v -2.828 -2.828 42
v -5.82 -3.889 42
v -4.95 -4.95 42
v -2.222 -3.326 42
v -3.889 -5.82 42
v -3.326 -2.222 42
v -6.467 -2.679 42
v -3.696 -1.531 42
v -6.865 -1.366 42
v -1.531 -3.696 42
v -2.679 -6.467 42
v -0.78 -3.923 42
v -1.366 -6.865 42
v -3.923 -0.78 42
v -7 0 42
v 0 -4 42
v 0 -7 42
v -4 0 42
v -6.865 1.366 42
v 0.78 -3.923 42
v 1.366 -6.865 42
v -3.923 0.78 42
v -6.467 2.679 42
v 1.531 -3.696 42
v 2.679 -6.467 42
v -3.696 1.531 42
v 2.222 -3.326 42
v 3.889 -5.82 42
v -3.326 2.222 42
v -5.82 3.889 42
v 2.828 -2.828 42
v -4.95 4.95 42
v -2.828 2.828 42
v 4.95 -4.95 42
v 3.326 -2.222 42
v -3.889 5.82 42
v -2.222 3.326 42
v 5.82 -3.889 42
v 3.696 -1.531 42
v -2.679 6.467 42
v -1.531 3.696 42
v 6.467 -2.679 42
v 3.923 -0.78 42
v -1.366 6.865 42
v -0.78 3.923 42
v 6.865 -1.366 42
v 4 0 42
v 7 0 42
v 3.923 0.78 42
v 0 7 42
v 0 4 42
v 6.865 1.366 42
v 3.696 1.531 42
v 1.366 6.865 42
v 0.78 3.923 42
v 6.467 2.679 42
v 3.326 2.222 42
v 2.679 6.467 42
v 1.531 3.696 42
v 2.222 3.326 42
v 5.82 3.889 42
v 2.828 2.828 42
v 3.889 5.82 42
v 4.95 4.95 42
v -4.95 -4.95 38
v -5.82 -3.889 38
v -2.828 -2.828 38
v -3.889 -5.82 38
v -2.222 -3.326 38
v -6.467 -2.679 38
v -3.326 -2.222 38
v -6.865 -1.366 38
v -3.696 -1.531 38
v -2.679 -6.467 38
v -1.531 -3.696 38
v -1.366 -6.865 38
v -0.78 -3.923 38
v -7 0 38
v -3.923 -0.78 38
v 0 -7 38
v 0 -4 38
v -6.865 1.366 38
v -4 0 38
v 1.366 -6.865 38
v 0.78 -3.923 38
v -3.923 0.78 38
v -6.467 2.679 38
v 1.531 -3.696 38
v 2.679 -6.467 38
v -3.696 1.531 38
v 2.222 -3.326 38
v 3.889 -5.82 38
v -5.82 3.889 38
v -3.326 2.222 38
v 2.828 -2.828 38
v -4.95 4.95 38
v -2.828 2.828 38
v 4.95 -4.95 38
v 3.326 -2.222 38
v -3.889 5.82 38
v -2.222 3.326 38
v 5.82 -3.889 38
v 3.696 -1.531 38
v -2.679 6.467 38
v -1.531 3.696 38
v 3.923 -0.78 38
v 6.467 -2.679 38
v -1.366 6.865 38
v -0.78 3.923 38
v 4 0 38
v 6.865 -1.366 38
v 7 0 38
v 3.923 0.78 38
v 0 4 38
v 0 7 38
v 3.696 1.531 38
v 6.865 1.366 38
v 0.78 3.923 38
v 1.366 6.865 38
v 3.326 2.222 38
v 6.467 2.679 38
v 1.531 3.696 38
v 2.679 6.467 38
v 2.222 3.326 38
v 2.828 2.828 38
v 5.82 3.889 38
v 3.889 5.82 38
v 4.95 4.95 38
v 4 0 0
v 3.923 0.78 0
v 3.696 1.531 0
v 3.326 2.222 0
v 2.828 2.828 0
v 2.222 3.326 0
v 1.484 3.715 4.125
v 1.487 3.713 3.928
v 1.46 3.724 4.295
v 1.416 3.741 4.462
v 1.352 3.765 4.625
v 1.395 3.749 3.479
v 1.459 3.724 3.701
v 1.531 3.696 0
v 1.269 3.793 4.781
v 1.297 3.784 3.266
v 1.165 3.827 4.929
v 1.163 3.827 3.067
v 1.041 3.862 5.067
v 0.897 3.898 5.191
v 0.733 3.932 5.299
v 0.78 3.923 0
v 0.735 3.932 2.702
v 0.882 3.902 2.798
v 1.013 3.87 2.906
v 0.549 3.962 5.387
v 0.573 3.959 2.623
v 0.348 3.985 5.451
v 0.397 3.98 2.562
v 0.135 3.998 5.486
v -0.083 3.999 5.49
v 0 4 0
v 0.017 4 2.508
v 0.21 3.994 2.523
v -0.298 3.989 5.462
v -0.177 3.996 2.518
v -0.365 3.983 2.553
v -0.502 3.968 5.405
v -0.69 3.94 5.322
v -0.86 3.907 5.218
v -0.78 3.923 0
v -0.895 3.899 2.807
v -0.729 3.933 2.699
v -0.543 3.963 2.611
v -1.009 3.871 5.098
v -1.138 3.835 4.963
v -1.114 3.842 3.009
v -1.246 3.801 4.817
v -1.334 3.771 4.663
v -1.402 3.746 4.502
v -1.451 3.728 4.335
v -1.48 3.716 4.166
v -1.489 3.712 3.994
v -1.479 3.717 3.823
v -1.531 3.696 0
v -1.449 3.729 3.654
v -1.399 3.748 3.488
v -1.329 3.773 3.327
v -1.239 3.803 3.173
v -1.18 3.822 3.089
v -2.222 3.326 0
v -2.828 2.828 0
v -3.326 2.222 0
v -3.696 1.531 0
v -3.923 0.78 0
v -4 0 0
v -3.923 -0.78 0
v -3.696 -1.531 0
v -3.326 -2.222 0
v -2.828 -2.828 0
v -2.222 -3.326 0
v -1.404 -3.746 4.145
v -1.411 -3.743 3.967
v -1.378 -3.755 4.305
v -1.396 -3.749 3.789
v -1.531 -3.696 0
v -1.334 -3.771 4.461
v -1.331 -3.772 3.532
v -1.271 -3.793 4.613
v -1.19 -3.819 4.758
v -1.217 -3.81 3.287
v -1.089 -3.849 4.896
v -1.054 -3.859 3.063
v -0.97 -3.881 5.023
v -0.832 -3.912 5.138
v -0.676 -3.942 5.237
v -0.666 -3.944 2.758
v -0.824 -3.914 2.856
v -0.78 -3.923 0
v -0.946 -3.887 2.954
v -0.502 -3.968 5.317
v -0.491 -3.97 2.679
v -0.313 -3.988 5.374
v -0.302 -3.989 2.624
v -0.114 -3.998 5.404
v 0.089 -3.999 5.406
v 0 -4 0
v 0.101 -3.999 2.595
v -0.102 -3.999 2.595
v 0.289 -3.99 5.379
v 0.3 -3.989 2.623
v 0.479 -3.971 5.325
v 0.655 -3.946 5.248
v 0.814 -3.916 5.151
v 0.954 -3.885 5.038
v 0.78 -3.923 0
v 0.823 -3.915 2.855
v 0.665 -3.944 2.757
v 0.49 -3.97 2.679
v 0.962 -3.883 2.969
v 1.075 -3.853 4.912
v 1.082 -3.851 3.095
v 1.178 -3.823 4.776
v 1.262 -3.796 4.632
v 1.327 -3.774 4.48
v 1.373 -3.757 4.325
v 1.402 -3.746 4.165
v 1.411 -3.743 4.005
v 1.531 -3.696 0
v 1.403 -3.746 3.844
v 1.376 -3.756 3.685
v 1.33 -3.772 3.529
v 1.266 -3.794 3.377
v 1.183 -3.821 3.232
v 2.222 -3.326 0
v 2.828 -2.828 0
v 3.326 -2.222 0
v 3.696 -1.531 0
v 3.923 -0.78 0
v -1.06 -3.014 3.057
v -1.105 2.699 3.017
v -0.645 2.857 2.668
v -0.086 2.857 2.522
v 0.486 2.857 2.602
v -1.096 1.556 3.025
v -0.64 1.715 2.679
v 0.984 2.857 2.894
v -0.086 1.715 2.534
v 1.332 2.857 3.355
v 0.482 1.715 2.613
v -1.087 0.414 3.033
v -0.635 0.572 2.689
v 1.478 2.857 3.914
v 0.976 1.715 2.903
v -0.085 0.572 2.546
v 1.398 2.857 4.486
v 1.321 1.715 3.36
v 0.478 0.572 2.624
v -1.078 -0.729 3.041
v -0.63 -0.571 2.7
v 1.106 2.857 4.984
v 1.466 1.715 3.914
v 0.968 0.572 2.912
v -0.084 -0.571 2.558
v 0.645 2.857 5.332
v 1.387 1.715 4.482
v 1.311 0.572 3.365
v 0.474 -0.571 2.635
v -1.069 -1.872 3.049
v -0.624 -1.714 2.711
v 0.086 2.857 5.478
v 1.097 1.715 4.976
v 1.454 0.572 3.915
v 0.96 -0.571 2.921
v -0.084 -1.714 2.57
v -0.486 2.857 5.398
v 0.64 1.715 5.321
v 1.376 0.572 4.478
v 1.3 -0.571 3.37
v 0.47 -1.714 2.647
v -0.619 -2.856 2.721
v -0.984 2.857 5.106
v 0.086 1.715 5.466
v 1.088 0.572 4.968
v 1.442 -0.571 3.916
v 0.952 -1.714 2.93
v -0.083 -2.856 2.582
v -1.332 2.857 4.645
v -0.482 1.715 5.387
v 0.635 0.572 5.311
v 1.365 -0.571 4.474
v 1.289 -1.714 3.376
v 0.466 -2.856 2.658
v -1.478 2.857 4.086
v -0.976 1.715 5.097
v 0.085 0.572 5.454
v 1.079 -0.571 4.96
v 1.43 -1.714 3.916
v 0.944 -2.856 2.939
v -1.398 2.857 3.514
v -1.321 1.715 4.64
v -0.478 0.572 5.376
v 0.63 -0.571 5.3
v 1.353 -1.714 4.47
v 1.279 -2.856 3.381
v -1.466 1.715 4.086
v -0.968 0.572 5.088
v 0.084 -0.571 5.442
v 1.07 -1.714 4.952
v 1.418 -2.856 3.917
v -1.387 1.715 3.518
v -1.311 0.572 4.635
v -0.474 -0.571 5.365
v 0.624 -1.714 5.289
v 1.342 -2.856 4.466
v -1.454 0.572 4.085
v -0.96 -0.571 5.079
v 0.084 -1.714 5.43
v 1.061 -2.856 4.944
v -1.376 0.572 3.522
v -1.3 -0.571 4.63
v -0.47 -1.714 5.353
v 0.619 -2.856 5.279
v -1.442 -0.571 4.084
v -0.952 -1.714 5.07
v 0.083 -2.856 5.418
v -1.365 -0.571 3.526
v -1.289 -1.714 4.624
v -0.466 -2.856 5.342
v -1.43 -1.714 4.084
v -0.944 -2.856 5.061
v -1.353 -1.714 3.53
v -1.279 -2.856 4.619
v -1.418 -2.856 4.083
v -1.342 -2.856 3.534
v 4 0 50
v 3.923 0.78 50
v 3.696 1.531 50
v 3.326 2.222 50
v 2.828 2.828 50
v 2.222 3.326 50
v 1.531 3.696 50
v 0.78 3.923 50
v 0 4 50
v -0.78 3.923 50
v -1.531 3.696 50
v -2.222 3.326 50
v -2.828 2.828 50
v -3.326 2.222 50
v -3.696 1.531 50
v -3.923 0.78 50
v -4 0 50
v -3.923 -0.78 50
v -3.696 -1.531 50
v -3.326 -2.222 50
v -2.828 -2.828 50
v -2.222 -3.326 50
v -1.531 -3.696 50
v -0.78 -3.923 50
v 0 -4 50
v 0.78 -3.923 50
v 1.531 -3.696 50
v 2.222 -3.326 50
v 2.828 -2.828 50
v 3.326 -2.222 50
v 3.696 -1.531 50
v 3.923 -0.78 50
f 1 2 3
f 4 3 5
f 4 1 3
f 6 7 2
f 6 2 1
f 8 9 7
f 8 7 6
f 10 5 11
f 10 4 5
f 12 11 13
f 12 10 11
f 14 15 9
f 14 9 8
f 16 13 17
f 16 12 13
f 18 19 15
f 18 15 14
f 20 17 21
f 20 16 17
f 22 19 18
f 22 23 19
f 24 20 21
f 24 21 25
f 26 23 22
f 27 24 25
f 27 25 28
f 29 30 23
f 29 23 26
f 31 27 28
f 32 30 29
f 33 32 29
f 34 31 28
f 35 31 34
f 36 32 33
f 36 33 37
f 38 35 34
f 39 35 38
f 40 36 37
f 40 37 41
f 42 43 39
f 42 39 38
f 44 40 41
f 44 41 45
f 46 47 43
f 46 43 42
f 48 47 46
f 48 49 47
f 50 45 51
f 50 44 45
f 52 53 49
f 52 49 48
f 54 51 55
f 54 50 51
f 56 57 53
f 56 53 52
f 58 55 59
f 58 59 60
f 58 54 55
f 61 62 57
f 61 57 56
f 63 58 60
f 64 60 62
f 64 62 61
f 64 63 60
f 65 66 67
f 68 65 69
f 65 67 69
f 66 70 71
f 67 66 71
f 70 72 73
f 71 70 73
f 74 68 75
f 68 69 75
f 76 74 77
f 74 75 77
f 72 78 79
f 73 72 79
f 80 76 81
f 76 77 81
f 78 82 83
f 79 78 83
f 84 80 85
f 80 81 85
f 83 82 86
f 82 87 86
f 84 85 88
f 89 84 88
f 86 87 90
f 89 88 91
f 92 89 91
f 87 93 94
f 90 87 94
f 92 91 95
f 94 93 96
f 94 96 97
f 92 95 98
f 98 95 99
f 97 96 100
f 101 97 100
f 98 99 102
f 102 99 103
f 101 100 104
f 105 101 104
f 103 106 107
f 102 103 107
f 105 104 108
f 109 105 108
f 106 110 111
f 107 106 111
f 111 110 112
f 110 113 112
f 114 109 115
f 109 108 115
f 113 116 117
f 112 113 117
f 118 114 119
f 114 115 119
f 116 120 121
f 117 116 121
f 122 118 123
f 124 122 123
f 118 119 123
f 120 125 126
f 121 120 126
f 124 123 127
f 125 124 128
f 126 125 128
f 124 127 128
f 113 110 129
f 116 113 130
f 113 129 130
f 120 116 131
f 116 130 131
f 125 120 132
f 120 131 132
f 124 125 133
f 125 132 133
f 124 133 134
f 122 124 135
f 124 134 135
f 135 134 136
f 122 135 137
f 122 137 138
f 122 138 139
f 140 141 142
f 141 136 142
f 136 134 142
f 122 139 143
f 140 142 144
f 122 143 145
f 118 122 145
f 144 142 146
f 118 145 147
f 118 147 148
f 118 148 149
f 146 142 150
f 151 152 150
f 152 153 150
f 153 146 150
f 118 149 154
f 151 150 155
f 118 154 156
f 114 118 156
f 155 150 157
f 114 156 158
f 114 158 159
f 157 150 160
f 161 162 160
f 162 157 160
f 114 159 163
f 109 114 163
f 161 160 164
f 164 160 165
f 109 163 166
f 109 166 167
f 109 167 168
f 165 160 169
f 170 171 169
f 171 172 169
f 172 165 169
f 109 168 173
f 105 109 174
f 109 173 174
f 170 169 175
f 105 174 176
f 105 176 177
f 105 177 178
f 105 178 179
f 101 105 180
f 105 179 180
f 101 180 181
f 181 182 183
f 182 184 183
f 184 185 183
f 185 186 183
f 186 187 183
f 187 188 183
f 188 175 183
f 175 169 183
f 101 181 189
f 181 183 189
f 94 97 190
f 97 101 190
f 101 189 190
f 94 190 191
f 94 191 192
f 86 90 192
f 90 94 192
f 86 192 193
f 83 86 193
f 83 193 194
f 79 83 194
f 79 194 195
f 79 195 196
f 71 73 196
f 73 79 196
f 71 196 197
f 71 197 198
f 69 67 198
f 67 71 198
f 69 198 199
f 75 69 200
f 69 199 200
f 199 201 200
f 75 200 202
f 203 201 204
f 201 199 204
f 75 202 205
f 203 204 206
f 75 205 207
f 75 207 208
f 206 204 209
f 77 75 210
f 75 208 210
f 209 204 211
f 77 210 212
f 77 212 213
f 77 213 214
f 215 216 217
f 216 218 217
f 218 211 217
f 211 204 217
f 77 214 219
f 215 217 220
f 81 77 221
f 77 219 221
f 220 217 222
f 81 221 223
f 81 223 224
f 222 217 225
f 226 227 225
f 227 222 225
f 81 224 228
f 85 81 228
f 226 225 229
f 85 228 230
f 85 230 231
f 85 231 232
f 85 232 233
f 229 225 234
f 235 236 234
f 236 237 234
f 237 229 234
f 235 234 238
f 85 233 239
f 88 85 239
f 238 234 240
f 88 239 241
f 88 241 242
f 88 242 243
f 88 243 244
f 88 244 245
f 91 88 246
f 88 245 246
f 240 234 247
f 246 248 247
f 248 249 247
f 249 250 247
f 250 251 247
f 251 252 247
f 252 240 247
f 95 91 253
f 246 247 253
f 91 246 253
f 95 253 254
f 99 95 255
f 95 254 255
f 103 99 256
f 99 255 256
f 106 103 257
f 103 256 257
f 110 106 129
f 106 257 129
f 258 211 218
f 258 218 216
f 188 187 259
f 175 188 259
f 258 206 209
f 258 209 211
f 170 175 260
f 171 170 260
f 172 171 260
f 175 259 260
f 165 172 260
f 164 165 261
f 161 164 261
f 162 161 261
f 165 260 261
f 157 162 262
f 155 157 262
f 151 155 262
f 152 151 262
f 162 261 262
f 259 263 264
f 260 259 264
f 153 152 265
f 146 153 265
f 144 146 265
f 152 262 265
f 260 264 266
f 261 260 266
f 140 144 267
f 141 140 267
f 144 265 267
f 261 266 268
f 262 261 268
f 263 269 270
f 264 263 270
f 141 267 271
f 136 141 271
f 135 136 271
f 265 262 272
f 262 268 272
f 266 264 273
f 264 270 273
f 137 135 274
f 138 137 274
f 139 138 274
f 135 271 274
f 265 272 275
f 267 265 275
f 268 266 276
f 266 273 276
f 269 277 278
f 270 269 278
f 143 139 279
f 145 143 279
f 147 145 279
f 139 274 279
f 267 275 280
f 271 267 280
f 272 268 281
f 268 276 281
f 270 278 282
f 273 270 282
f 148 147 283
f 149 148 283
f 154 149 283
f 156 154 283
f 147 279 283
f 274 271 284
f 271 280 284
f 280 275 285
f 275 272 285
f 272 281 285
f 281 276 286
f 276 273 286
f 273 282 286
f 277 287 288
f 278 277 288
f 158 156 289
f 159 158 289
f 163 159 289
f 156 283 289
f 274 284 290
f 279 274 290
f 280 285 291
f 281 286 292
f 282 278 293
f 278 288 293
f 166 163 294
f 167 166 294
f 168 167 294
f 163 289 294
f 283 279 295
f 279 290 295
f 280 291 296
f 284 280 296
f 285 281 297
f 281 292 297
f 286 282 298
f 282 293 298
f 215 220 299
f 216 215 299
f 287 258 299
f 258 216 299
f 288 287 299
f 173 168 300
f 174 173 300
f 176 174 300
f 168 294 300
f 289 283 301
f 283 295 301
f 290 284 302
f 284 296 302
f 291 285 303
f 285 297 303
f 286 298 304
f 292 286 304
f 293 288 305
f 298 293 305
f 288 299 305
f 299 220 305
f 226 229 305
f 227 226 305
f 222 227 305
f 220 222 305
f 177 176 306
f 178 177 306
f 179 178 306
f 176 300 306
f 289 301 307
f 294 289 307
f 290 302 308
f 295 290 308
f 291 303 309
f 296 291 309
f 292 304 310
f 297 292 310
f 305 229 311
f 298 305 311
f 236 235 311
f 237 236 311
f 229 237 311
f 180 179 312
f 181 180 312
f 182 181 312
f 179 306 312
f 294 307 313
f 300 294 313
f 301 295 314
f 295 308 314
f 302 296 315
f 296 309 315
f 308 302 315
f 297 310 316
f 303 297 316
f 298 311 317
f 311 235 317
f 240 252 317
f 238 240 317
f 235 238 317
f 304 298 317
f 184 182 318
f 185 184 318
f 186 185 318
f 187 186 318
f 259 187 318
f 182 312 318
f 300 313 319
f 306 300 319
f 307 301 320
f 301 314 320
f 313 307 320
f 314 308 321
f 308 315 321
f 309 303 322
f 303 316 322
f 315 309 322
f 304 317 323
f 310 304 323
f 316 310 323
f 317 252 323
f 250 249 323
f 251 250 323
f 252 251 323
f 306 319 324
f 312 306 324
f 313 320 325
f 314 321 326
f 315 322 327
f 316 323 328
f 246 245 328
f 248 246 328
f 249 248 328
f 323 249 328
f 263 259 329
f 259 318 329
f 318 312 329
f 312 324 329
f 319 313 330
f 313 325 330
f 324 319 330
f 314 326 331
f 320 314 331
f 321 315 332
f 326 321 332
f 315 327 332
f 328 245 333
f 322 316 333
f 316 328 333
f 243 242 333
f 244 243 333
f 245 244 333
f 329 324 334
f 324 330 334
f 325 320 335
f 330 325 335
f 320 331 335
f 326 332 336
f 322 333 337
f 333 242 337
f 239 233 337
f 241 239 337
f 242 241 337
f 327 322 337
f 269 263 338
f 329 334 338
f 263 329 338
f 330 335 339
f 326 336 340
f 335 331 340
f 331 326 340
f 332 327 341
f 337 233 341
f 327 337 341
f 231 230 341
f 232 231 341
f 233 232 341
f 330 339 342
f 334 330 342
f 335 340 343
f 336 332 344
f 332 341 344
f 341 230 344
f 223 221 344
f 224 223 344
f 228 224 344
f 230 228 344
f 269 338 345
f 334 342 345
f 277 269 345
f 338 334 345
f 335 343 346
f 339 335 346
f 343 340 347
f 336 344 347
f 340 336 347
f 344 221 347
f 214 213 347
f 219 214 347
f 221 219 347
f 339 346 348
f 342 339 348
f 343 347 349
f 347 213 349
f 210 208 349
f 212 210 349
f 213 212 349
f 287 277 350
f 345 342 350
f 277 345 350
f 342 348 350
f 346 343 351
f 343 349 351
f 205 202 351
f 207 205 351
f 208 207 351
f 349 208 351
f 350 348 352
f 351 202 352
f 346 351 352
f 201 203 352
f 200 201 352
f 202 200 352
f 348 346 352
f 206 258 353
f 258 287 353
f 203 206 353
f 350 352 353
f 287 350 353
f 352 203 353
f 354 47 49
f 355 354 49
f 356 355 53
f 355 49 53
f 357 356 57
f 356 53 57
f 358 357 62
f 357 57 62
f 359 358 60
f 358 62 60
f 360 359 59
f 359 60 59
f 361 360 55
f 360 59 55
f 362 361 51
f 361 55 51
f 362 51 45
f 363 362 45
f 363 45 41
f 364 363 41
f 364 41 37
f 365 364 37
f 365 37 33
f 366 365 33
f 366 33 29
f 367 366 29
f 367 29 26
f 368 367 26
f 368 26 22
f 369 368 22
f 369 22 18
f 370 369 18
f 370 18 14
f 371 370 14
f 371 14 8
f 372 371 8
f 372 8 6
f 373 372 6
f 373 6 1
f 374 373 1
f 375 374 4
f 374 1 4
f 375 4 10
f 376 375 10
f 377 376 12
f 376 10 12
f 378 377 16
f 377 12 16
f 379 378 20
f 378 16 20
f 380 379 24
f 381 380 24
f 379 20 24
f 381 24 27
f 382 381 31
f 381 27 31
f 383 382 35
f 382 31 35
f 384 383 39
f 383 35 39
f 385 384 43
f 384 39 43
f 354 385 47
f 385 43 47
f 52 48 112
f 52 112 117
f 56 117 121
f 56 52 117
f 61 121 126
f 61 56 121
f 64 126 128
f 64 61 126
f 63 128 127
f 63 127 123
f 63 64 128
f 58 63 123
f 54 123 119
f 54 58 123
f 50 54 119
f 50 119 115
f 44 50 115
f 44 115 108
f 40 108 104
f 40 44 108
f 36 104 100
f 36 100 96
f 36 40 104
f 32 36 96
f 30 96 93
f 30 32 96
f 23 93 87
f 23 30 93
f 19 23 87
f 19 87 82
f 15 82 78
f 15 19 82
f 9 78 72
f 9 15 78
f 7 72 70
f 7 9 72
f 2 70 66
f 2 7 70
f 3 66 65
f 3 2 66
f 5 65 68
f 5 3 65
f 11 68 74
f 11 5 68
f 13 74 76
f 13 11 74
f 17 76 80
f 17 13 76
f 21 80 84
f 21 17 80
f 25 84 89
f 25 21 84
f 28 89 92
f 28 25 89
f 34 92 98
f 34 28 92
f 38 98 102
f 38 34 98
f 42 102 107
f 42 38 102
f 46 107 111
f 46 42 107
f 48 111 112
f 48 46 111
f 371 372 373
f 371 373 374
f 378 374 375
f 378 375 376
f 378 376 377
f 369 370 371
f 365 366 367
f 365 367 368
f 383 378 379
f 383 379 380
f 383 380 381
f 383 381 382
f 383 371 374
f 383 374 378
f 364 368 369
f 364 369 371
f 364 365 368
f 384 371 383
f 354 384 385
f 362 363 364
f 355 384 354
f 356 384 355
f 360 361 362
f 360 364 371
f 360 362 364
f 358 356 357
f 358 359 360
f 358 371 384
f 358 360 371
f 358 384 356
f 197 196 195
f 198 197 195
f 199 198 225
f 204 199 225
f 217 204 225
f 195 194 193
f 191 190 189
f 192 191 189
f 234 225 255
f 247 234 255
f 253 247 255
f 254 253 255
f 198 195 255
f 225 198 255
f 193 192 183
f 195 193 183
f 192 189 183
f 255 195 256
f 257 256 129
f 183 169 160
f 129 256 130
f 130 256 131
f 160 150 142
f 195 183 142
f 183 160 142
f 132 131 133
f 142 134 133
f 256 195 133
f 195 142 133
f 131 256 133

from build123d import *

# Parameters (mm, degrees)
SKETCH_1_R      = 4
EXTRUDE_1_DEPTH = 50
EXTRUDE_START   = -8
SKETCH_2_R      = 7
EXTRUDE_2_DEPTH = 4


with BuildPart() as part:
    # 草图1 → 凸台-拉伸1 (new body)
    with BuildSketch(Plane.XY):
        Circle(SKETCH_1_R)
    extrude(amount=EXTRUDE_1_DEPTH)

    # 草图2 → 凸台-拉伸2 (add)
    with BuildSketch(Plane.XY.offset(50).offset(EXTRUDE_START)):
        Circle(SKETCH_2_R)
    extrude(amount=-EXTRUDE_2_DEPTH)

    # 草图4 → 切除-旋转1 (revolve, cut)
    with BuildSketch(Plane(origin=(0, 0, 0), x_dir=(0, 0, -1), z_dir=(1, 0, 0)), mode=Mode.PRIVATE) as cut_revolve_1_sk:
        Polygon((-2.6, -4.84176312), (-4, -4.84176312), (-4, 4.751502862), (-2.5, 4.751502862), align=None)
    revolve(cut_revolve_1_sk.sketch.rotate(Axis((0, 6.786956164, 4), (0, -1, 0)), 311.656275419), axis=Axis((0, 6.786956164, 4), (0, -1, 0)), mode=Mode.SUBTRACT)


solid = part.part
